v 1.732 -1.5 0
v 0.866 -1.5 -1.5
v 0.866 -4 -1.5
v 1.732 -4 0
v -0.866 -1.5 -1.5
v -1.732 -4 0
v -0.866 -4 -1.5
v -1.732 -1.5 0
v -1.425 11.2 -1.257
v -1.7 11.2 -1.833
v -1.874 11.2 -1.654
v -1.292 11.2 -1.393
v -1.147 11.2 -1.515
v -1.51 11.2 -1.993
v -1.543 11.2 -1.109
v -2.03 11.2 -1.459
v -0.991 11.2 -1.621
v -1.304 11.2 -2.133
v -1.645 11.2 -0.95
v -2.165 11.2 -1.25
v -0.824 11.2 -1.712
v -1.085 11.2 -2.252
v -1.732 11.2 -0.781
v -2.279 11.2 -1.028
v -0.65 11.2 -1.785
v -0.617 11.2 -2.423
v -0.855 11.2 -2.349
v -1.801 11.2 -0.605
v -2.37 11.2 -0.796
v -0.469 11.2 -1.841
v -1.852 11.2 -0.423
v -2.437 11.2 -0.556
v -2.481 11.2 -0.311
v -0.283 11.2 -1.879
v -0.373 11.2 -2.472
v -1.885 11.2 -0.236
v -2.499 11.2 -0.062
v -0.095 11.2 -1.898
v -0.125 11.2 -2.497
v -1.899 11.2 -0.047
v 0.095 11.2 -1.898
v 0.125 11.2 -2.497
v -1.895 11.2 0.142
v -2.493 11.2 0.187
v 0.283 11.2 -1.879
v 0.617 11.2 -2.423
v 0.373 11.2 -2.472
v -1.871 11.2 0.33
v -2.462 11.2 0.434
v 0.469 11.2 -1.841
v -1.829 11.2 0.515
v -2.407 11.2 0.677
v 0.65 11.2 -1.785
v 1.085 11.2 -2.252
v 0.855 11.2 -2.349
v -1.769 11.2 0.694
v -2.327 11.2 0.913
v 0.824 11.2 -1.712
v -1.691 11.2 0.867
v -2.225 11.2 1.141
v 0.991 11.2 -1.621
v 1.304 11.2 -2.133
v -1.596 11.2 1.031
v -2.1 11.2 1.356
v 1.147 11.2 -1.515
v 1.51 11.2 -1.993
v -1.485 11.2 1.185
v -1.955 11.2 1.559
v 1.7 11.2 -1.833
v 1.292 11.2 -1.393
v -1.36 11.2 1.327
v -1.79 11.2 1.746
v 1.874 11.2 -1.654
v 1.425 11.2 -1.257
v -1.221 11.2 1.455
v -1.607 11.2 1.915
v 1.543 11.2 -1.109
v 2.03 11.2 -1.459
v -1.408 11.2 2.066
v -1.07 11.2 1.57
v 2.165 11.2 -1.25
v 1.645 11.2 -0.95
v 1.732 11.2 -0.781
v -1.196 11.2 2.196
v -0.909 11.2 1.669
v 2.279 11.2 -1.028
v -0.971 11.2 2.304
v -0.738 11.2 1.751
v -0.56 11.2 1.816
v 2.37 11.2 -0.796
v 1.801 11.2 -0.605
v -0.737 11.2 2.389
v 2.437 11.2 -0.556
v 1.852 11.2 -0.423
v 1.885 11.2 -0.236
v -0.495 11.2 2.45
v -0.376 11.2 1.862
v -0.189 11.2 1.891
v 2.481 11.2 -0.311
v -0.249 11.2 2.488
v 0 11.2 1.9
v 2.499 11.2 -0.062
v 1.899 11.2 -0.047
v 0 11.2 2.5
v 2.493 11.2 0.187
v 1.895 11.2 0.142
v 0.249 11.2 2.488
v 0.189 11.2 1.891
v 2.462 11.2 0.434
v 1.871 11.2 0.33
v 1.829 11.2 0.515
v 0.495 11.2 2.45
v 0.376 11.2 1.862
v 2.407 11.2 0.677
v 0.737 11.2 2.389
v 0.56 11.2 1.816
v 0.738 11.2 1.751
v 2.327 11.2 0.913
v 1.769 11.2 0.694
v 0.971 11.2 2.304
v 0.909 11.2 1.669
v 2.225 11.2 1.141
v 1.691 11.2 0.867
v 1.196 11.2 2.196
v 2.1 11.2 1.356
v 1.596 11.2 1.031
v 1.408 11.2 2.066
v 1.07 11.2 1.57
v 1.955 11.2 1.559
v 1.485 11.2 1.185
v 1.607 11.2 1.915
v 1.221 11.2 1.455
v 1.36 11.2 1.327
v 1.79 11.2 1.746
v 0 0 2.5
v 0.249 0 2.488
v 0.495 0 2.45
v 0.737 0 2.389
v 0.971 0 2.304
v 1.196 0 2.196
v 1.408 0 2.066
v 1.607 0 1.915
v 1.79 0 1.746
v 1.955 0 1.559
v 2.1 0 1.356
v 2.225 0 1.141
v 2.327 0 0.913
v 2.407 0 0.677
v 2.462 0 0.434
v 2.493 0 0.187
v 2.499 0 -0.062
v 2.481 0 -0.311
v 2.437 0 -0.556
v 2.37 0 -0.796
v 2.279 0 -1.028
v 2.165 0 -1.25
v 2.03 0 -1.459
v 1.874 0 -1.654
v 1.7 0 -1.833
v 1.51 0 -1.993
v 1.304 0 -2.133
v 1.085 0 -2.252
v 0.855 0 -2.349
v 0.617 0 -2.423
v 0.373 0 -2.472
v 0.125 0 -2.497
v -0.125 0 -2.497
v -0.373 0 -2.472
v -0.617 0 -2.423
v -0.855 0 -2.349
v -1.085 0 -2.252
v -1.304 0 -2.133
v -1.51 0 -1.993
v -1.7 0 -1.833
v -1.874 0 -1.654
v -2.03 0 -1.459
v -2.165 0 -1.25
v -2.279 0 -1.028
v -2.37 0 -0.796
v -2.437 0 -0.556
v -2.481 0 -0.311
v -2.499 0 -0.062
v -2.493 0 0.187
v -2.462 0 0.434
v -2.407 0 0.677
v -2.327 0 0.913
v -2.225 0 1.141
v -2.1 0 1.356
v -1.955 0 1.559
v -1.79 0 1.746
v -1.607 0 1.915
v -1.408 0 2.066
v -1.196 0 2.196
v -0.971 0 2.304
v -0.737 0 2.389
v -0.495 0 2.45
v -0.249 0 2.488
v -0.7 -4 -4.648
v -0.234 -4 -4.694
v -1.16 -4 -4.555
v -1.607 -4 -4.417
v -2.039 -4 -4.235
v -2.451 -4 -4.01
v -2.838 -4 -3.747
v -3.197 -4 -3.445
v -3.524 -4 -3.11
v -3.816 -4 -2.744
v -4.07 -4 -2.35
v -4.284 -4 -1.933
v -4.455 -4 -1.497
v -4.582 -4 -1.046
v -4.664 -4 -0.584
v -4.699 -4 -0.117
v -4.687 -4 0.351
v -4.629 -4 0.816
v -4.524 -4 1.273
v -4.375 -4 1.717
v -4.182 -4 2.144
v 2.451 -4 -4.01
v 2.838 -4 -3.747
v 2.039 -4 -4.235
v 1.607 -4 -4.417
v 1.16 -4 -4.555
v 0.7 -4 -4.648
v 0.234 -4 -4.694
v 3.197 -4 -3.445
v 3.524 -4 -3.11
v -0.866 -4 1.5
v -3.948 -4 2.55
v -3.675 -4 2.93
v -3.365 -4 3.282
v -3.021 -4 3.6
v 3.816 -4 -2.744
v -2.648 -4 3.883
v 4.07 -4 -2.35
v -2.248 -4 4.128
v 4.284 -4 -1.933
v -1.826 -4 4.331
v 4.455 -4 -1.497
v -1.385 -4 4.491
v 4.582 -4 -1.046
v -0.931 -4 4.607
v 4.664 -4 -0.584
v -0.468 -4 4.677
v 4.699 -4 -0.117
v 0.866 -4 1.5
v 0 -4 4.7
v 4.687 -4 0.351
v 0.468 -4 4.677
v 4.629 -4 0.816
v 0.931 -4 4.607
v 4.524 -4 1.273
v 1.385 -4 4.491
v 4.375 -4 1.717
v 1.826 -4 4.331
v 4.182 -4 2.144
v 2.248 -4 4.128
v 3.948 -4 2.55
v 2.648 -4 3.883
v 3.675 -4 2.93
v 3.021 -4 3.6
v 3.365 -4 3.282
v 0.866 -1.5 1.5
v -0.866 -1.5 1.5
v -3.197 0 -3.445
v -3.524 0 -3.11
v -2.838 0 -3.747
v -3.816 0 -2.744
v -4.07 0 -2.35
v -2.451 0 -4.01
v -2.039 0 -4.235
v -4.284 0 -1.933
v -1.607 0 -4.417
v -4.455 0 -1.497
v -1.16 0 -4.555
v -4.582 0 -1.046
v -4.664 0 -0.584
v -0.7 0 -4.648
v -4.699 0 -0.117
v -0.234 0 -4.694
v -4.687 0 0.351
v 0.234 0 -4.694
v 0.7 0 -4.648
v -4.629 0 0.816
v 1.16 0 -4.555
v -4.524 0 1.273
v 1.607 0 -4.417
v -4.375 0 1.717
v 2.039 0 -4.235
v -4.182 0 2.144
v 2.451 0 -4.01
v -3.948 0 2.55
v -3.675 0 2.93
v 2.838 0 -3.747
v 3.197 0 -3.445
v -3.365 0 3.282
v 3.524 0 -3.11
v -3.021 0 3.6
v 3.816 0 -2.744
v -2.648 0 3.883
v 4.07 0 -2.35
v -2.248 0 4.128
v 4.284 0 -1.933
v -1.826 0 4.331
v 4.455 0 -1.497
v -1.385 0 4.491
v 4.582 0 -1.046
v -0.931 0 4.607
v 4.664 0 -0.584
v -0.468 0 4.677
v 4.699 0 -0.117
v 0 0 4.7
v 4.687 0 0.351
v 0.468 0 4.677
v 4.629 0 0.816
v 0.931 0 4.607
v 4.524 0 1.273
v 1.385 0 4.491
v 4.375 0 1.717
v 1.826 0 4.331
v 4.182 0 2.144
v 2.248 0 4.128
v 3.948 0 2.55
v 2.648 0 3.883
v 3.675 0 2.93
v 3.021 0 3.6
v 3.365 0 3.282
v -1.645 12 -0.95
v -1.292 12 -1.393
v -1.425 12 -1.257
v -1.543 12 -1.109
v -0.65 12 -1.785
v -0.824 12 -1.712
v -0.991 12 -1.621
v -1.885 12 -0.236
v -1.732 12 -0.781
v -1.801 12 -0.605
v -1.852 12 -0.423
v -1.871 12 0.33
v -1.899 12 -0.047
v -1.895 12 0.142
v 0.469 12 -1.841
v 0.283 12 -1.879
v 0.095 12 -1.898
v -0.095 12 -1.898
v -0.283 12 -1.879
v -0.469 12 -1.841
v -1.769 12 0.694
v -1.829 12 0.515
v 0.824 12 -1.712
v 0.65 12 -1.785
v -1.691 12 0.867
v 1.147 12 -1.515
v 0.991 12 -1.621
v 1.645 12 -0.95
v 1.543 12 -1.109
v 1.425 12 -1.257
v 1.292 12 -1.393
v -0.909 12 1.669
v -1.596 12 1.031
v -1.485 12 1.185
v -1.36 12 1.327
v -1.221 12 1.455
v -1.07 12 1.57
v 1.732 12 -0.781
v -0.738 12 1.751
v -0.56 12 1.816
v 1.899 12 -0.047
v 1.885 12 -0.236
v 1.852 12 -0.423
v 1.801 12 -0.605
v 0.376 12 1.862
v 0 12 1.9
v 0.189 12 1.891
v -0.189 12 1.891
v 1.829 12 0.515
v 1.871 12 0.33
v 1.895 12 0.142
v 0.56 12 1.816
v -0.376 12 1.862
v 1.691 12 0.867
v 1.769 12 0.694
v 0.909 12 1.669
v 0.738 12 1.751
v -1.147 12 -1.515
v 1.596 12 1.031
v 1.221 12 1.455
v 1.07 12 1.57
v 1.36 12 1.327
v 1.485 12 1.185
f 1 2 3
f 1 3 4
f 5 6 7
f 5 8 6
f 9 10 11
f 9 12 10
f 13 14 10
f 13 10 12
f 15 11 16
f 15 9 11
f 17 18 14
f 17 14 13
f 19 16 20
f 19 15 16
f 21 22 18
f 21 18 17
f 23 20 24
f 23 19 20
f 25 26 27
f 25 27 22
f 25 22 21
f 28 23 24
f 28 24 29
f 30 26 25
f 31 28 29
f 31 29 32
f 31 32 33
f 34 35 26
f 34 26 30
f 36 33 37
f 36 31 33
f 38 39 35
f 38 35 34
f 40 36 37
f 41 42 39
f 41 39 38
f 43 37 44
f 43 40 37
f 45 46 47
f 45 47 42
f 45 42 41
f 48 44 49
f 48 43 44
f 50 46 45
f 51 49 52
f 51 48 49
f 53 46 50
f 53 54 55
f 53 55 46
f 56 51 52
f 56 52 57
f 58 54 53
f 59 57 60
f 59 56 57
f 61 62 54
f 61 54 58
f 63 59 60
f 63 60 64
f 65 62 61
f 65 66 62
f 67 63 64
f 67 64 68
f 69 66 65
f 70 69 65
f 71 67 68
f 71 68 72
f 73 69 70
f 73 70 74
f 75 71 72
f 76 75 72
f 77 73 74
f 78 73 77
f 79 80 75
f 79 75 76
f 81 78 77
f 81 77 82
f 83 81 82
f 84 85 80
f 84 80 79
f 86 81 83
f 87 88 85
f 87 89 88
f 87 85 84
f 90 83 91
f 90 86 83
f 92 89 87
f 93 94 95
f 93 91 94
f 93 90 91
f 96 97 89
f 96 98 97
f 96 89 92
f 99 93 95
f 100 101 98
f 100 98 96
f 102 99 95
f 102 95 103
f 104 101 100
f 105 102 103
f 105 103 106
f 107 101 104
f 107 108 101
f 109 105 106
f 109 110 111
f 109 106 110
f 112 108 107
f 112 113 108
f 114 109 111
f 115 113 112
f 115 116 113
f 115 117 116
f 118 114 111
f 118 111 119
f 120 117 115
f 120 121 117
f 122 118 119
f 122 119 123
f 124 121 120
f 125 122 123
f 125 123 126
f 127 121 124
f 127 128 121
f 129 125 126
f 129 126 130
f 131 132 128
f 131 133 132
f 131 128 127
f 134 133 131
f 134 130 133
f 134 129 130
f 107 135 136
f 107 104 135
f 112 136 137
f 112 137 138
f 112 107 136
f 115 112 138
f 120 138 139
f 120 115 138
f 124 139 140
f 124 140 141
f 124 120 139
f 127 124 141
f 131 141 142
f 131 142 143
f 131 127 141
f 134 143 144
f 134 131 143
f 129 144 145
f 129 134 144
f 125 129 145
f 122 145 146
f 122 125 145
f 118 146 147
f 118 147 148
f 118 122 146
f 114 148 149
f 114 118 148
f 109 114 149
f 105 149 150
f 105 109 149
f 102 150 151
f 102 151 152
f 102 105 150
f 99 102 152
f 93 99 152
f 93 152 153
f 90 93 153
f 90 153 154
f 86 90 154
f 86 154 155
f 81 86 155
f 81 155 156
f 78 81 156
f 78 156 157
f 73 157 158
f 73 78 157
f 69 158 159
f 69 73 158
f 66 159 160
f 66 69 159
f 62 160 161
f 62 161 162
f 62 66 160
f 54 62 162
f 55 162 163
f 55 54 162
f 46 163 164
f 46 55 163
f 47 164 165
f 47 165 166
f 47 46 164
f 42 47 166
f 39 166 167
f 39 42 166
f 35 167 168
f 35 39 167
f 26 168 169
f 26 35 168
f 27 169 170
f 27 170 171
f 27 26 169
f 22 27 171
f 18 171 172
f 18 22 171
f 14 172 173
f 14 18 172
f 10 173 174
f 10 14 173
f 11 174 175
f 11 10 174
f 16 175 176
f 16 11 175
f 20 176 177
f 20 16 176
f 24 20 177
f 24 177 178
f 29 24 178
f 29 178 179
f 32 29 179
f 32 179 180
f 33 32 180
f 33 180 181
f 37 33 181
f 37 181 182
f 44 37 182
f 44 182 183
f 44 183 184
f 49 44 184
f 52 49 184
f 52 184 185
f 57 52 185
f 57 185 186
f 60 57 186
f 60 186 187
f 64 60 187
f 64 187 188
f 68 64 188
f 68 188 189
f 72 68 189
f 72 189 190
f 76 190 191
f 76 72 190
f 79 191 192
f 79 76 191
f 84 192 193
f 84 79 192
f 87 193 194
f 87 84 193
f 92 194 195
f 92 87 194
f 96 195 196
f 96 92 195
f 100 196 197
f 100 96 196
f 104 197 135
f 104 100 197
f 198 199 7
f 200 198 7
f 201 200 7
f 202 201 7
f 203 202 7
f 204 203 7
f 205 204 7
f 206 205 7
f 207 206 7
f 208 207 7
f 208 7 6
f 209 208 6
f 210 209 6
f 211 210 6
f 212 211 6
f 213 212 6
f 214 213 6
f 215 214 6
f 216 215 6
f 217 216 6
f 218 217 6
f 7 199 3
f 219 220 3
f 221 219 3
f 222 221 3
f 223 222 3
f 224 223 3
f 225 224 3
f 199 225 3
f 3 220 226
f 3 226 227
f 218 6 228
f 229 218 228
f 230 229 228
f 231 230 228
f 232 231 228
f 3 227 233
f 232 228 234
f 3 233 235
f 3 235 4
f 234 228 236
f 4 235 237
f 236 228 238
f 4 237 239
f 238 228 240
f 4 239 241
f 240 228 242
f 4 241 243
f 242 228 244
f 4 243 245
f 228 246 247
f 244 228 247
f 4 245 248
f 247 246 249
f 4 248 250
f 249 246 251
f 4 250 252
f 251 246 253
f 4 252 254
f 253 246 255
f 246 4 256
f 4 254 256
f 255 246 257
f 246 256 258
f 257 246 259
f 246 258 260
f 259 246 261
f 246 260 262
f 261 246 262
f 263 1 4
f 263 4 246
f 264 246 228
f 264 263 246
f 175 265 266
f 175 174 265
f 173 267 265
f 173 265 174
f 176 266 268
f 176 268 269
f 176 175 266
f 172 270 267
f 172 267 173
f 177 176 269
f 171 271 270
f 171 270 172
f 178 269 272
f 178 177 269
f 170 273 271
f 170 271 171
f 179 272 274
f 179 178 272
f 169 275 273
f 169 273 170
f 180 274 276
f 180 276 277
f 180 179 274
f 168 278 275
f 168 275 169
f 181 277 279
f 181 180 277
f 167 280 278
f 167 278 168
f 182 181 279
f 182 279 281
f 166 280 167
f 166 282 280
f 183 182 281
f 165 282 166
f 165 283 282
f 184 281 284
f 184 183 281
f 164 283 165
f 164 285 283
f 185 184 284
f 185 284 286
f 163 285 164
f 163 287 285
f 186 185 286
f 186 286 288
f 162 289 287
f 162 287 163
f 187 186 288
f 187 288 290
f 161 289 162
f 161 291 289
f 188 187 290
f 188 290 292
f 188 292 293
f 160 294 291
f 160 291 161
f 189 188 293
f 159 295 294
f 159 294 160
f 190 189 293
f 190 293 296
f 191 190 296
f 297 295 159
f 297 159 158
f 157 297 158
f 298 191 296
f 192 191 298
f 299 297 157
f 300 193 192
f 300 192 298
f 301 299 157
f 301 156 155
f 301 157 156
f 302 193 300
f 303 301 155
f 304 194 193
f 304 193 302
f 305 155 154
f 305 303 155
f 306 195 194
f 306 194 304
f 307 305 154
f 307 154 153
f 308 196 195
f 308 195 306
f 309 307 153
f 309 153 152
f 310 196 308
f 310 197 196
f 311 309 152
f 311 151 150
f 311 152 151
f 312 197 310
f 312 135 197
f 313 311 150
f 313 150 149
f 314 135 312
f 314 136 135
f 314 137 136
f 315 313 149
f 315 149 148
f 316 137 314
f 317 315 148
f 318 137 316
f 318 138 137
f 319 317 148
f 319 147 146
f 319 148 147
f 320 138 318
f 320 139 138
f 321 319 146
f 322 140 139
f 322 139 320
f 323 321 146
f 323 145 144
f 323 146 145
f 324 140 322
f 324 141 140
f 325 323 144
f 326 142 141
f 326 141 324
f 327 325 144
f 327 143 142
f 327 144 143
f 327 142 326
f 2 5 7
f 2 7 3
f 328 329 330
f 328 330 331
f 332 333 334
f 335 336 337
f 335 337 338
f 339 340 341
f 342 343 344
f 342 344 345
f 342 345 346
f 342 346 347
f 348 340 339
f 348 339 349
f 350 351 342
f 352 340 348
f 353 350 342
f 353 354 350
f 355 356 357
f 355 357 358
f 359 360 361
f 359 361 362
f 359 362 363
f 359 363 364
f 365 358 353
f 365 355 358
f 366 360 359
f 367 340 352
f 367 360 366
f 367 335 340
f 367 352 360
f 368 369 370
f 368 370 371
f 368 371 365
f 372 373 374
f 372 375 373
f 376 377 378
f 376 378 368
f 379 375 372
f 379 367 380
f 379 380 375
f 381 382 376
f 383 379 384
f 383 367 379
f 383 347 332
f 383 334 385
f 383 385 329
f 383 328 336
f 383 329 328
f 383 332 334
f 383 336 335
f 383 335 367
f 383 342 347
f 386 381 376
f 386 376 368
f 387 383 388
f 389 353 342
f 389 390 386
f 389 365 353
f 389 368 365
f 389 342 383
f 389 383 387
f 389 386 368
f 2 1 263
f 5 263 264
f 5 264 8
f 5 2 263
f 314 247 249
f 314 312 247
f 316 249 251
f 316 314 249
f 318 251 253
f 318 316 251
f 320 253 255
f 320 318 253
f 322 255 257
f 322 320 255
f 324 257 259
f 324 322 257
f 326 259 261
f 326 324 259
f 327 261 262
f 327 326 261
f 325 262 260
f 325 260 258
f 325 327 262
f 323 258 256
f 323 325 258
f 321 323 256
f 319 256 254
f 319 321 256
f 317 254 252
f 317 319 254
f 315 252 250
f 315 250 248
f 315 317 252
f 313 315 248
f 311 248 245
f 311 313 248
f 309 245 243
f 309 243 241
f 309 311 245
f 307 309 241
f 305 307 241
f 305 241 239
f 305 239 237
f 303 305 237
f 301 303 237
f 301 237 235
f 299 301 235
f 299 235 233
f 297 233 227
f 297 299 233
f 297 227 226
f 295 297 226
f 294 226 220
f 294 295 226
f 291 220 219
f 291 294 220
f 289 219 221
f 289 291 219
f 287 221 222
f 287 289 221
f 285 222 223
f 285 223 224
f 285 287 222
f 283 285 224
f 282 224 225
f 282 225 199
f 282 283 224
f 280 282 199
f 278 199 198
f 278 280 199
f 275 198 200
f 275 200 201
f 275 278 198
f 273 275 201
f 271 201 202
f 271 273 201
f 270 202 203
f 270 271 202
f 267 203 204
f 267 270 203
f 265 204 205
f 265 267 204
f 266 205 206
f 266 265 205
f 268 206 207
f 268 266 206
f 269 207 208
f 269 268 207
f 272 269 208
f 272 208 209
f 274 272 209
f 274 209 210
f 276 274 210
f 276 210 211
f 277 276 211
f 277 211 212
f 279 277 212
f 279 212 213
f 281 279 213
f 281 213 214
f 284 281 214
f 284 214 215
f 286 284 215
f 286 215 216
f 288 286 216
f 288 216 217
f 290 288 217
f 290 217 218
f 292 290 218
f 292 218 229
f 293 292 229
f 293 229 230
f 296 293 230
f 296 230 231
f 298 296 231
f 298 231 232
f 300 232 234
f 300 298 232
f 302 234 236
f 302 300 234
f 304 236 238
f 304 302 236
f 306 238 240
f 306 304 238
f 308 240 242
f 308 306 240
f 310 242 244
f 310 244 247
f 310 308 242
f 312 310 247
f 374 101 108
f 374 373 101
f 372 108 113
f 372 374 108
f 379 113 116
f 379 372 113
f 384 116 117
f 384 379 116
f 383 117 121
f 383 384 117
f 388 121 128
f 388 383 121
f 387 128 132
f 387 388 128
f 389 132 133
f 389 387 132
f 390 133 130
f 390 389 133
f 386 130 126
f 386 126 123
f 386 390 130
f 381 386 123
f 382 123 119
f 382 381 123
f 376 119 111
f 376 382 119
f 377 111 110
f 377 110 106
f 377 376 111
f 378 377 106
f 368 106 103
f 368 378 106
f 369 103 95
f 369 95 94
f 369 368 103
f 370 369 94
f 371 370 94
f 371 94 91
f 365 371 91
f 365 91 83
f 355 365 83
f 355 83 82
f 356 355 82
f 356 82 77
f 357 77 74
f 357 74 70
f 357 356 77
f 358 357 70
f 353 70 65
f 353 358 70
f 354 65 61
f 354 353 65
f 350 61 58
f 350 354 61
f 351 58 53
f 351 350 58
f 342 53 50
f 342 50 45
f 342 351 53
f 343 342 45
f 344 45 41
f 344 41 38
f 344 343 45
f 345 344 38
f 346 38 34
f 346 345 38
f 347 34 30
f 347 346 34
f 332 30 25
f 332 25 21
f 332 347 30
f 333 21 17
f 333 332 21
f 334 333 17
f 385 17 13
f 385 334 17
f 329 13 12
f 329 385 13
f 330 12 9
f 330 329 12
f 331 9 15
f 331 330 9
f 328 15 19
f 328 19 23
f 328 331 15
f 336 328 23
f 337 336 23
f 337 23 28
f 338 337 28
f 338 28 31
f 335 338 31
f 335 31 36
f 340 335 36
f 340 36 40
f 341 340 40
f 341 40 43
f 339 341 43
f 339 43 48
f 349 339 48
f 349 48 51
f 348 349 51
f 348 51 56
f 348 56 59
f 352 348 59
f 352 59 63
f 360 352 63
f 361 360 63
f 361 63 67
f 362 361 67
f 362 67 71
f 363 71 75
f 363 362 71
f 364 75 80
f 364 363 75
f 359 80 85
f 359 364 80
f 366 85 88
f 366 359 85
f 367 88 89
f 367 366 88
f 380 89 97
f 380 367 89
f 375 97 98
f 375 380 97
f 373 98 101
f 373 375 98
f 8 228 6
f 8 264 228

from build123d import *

# Parameters (mm, degrees)
SKETCH1_R           = 4.7
BOSS_EXTRUDE1_DEPTH = 2
SKETCH2_R           = 2.5
BOSS_EXTRUDE2_DEPTH = 5.6
SKETCH3_R           = 1.9
BOSS_EXTRUDE3_DEPTH = 0.4
CUT_EXTRUDE1_DEPTH  = 1.25


with BuildPart() as part:
    # Sketch1 → Boss-Extrude1 (new, symmetric)
    with BuildSketch(Plane(origin=(0, -2, 0), x_dir=(1, 0, 0), z_dir=(0, 1, 0))):
        with Locations(Location((0, 0, 0), (0, 0, 270))):
            Circle(SKETCH1_R)
    extrude(amount=BOSS_EXTRUDE1_DEPTH, both=True)

    # Sketch2 → Boss-Extrude2 (add, symmetric)
    with BuildSketch(Plane(origin=(0, 5.6, 0), x_dir=(1, 0, 0), z_dir=(0, 1, 0))):
        with Locations(Location((0, 0, 0), (0, 0, 270))):
            Circle(SKETCH2_R)
    extrude(amount=BOSS_EXTRUDE2_DEPTH, both=True)

    # Sketch3 → Boss-Extrude3 (add, symmetric)
    with BuildSketch(Plane(origin=(0, 11.6, 0), x_dir=(1, 0, 0), z_dir=(0, 1, 0))):
        with Locations(Location((0, 0, 0), (0, 0, 270))):
            Circle(SKETCH3_R)
    extrude(amount=BOSS_EXTRUDE3_DEPTH, both=True)

    # Sketch4 → Cut-Extrude1 (cut, symmetric)
    with BuildSketch(Plane(origin=(0, -2.75, 0), x_dir=(1, 0, 0), z_dir=(0, 1, 0))):
        Polygon((1.732050808, 0), (0.866025404, -1.5), (-0.866025404, -1.5), (-1.732050808, 0), (-0.866025404, 1.5), (0.866025404, 1.5), align=None)
    extrude(amount=CUT_EXTRUDE1_DEPTH, both=True, mode=Mode.SUBTRACT)


solid = part.part
